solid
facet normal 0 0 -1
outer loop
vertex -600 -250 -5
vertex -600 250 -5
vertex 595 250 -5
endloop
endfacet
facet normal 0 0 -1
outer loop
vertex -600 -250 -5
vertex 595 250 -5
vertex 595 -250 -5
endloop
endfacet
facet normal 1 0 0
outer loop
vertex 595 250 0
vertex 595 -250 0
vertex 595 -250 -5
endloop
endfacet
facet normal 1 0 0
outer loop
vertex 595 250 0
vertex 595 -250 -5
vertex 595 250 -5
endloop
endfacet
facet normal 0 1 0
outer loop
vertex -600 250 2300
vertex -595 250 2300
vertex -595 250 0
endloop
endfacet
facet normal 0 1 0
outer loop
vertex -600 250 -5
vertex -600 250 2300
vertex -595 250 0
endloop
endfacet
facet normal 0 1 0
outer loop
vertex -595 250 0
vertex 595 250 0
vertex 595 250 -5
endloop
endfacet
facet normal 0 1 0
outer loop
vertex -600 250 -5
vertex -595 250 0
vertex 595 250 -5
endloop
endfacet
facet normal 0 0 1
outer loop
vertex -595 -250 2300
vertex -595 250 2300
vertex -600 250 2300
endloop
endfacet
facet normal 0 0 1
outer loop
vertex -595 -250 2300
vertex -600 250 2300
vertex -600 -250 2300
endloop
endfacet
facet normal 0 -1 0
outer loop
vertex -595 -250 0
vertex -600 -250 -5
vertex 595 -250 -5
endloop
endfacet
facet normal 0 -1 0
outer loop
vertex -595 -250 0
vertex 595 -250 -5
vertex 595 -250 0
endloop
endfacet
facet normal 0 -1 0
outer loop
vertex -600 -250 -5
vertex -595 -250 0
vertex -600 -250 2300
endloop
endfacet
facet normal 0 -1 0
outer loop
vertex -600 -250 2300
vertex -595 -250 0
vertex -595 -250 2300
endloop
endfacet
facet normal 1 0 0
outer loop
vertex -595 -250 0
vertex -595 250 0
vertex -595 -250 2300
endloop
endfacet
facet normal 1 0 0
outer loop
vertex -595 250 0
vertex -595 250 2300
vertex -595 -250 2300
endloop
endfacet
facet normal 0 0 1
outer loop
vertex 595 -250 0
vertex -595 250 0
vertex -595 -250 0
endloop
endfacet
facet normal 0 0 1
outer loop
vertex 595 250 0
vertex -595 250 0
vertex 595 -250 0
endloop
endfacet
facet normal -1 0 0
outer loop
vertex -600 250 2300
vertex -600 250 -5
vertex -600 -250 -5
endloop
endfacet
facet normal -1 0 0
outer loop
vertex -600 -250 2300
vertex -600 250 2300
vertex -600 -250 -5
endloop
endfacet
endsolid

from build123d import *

# Parameters (mm, degrees)
F0_W     = 1190
F0_H     = 500
F1_DEPTH = 5
F2_W     = 500
F2_H     = 5
F2_H_2   = 2300
F3_DEPTH = 5


# Not quite as in the source:
# - the program builds the solid bodies; features that only make, move or delete a surface that nothing else refers to are left out


with BuildPart() as f1:
    # F0 (on Top) → F1 (new body)
    with BuildSketch(Plane.XY):
        Rectangle(F0_W, F0_H)
    extrude(amount=-F1_DEPTH)

    # F2 (on face) → F3 (join)
    with BuildSketch(Plane(origin=(-595, 0, 0), x_dir=(0, -1, 0), z_dir=(-1, 0, 0))):
        with Locations((0, -2.5)):
            Rectangle(F2_W, F2_H)
        with Locations((0, 1150)):
            Rectangle(F2_W, F2_H_2)
    extrude(amount=F3_DEPTH)


solid = f1.part
